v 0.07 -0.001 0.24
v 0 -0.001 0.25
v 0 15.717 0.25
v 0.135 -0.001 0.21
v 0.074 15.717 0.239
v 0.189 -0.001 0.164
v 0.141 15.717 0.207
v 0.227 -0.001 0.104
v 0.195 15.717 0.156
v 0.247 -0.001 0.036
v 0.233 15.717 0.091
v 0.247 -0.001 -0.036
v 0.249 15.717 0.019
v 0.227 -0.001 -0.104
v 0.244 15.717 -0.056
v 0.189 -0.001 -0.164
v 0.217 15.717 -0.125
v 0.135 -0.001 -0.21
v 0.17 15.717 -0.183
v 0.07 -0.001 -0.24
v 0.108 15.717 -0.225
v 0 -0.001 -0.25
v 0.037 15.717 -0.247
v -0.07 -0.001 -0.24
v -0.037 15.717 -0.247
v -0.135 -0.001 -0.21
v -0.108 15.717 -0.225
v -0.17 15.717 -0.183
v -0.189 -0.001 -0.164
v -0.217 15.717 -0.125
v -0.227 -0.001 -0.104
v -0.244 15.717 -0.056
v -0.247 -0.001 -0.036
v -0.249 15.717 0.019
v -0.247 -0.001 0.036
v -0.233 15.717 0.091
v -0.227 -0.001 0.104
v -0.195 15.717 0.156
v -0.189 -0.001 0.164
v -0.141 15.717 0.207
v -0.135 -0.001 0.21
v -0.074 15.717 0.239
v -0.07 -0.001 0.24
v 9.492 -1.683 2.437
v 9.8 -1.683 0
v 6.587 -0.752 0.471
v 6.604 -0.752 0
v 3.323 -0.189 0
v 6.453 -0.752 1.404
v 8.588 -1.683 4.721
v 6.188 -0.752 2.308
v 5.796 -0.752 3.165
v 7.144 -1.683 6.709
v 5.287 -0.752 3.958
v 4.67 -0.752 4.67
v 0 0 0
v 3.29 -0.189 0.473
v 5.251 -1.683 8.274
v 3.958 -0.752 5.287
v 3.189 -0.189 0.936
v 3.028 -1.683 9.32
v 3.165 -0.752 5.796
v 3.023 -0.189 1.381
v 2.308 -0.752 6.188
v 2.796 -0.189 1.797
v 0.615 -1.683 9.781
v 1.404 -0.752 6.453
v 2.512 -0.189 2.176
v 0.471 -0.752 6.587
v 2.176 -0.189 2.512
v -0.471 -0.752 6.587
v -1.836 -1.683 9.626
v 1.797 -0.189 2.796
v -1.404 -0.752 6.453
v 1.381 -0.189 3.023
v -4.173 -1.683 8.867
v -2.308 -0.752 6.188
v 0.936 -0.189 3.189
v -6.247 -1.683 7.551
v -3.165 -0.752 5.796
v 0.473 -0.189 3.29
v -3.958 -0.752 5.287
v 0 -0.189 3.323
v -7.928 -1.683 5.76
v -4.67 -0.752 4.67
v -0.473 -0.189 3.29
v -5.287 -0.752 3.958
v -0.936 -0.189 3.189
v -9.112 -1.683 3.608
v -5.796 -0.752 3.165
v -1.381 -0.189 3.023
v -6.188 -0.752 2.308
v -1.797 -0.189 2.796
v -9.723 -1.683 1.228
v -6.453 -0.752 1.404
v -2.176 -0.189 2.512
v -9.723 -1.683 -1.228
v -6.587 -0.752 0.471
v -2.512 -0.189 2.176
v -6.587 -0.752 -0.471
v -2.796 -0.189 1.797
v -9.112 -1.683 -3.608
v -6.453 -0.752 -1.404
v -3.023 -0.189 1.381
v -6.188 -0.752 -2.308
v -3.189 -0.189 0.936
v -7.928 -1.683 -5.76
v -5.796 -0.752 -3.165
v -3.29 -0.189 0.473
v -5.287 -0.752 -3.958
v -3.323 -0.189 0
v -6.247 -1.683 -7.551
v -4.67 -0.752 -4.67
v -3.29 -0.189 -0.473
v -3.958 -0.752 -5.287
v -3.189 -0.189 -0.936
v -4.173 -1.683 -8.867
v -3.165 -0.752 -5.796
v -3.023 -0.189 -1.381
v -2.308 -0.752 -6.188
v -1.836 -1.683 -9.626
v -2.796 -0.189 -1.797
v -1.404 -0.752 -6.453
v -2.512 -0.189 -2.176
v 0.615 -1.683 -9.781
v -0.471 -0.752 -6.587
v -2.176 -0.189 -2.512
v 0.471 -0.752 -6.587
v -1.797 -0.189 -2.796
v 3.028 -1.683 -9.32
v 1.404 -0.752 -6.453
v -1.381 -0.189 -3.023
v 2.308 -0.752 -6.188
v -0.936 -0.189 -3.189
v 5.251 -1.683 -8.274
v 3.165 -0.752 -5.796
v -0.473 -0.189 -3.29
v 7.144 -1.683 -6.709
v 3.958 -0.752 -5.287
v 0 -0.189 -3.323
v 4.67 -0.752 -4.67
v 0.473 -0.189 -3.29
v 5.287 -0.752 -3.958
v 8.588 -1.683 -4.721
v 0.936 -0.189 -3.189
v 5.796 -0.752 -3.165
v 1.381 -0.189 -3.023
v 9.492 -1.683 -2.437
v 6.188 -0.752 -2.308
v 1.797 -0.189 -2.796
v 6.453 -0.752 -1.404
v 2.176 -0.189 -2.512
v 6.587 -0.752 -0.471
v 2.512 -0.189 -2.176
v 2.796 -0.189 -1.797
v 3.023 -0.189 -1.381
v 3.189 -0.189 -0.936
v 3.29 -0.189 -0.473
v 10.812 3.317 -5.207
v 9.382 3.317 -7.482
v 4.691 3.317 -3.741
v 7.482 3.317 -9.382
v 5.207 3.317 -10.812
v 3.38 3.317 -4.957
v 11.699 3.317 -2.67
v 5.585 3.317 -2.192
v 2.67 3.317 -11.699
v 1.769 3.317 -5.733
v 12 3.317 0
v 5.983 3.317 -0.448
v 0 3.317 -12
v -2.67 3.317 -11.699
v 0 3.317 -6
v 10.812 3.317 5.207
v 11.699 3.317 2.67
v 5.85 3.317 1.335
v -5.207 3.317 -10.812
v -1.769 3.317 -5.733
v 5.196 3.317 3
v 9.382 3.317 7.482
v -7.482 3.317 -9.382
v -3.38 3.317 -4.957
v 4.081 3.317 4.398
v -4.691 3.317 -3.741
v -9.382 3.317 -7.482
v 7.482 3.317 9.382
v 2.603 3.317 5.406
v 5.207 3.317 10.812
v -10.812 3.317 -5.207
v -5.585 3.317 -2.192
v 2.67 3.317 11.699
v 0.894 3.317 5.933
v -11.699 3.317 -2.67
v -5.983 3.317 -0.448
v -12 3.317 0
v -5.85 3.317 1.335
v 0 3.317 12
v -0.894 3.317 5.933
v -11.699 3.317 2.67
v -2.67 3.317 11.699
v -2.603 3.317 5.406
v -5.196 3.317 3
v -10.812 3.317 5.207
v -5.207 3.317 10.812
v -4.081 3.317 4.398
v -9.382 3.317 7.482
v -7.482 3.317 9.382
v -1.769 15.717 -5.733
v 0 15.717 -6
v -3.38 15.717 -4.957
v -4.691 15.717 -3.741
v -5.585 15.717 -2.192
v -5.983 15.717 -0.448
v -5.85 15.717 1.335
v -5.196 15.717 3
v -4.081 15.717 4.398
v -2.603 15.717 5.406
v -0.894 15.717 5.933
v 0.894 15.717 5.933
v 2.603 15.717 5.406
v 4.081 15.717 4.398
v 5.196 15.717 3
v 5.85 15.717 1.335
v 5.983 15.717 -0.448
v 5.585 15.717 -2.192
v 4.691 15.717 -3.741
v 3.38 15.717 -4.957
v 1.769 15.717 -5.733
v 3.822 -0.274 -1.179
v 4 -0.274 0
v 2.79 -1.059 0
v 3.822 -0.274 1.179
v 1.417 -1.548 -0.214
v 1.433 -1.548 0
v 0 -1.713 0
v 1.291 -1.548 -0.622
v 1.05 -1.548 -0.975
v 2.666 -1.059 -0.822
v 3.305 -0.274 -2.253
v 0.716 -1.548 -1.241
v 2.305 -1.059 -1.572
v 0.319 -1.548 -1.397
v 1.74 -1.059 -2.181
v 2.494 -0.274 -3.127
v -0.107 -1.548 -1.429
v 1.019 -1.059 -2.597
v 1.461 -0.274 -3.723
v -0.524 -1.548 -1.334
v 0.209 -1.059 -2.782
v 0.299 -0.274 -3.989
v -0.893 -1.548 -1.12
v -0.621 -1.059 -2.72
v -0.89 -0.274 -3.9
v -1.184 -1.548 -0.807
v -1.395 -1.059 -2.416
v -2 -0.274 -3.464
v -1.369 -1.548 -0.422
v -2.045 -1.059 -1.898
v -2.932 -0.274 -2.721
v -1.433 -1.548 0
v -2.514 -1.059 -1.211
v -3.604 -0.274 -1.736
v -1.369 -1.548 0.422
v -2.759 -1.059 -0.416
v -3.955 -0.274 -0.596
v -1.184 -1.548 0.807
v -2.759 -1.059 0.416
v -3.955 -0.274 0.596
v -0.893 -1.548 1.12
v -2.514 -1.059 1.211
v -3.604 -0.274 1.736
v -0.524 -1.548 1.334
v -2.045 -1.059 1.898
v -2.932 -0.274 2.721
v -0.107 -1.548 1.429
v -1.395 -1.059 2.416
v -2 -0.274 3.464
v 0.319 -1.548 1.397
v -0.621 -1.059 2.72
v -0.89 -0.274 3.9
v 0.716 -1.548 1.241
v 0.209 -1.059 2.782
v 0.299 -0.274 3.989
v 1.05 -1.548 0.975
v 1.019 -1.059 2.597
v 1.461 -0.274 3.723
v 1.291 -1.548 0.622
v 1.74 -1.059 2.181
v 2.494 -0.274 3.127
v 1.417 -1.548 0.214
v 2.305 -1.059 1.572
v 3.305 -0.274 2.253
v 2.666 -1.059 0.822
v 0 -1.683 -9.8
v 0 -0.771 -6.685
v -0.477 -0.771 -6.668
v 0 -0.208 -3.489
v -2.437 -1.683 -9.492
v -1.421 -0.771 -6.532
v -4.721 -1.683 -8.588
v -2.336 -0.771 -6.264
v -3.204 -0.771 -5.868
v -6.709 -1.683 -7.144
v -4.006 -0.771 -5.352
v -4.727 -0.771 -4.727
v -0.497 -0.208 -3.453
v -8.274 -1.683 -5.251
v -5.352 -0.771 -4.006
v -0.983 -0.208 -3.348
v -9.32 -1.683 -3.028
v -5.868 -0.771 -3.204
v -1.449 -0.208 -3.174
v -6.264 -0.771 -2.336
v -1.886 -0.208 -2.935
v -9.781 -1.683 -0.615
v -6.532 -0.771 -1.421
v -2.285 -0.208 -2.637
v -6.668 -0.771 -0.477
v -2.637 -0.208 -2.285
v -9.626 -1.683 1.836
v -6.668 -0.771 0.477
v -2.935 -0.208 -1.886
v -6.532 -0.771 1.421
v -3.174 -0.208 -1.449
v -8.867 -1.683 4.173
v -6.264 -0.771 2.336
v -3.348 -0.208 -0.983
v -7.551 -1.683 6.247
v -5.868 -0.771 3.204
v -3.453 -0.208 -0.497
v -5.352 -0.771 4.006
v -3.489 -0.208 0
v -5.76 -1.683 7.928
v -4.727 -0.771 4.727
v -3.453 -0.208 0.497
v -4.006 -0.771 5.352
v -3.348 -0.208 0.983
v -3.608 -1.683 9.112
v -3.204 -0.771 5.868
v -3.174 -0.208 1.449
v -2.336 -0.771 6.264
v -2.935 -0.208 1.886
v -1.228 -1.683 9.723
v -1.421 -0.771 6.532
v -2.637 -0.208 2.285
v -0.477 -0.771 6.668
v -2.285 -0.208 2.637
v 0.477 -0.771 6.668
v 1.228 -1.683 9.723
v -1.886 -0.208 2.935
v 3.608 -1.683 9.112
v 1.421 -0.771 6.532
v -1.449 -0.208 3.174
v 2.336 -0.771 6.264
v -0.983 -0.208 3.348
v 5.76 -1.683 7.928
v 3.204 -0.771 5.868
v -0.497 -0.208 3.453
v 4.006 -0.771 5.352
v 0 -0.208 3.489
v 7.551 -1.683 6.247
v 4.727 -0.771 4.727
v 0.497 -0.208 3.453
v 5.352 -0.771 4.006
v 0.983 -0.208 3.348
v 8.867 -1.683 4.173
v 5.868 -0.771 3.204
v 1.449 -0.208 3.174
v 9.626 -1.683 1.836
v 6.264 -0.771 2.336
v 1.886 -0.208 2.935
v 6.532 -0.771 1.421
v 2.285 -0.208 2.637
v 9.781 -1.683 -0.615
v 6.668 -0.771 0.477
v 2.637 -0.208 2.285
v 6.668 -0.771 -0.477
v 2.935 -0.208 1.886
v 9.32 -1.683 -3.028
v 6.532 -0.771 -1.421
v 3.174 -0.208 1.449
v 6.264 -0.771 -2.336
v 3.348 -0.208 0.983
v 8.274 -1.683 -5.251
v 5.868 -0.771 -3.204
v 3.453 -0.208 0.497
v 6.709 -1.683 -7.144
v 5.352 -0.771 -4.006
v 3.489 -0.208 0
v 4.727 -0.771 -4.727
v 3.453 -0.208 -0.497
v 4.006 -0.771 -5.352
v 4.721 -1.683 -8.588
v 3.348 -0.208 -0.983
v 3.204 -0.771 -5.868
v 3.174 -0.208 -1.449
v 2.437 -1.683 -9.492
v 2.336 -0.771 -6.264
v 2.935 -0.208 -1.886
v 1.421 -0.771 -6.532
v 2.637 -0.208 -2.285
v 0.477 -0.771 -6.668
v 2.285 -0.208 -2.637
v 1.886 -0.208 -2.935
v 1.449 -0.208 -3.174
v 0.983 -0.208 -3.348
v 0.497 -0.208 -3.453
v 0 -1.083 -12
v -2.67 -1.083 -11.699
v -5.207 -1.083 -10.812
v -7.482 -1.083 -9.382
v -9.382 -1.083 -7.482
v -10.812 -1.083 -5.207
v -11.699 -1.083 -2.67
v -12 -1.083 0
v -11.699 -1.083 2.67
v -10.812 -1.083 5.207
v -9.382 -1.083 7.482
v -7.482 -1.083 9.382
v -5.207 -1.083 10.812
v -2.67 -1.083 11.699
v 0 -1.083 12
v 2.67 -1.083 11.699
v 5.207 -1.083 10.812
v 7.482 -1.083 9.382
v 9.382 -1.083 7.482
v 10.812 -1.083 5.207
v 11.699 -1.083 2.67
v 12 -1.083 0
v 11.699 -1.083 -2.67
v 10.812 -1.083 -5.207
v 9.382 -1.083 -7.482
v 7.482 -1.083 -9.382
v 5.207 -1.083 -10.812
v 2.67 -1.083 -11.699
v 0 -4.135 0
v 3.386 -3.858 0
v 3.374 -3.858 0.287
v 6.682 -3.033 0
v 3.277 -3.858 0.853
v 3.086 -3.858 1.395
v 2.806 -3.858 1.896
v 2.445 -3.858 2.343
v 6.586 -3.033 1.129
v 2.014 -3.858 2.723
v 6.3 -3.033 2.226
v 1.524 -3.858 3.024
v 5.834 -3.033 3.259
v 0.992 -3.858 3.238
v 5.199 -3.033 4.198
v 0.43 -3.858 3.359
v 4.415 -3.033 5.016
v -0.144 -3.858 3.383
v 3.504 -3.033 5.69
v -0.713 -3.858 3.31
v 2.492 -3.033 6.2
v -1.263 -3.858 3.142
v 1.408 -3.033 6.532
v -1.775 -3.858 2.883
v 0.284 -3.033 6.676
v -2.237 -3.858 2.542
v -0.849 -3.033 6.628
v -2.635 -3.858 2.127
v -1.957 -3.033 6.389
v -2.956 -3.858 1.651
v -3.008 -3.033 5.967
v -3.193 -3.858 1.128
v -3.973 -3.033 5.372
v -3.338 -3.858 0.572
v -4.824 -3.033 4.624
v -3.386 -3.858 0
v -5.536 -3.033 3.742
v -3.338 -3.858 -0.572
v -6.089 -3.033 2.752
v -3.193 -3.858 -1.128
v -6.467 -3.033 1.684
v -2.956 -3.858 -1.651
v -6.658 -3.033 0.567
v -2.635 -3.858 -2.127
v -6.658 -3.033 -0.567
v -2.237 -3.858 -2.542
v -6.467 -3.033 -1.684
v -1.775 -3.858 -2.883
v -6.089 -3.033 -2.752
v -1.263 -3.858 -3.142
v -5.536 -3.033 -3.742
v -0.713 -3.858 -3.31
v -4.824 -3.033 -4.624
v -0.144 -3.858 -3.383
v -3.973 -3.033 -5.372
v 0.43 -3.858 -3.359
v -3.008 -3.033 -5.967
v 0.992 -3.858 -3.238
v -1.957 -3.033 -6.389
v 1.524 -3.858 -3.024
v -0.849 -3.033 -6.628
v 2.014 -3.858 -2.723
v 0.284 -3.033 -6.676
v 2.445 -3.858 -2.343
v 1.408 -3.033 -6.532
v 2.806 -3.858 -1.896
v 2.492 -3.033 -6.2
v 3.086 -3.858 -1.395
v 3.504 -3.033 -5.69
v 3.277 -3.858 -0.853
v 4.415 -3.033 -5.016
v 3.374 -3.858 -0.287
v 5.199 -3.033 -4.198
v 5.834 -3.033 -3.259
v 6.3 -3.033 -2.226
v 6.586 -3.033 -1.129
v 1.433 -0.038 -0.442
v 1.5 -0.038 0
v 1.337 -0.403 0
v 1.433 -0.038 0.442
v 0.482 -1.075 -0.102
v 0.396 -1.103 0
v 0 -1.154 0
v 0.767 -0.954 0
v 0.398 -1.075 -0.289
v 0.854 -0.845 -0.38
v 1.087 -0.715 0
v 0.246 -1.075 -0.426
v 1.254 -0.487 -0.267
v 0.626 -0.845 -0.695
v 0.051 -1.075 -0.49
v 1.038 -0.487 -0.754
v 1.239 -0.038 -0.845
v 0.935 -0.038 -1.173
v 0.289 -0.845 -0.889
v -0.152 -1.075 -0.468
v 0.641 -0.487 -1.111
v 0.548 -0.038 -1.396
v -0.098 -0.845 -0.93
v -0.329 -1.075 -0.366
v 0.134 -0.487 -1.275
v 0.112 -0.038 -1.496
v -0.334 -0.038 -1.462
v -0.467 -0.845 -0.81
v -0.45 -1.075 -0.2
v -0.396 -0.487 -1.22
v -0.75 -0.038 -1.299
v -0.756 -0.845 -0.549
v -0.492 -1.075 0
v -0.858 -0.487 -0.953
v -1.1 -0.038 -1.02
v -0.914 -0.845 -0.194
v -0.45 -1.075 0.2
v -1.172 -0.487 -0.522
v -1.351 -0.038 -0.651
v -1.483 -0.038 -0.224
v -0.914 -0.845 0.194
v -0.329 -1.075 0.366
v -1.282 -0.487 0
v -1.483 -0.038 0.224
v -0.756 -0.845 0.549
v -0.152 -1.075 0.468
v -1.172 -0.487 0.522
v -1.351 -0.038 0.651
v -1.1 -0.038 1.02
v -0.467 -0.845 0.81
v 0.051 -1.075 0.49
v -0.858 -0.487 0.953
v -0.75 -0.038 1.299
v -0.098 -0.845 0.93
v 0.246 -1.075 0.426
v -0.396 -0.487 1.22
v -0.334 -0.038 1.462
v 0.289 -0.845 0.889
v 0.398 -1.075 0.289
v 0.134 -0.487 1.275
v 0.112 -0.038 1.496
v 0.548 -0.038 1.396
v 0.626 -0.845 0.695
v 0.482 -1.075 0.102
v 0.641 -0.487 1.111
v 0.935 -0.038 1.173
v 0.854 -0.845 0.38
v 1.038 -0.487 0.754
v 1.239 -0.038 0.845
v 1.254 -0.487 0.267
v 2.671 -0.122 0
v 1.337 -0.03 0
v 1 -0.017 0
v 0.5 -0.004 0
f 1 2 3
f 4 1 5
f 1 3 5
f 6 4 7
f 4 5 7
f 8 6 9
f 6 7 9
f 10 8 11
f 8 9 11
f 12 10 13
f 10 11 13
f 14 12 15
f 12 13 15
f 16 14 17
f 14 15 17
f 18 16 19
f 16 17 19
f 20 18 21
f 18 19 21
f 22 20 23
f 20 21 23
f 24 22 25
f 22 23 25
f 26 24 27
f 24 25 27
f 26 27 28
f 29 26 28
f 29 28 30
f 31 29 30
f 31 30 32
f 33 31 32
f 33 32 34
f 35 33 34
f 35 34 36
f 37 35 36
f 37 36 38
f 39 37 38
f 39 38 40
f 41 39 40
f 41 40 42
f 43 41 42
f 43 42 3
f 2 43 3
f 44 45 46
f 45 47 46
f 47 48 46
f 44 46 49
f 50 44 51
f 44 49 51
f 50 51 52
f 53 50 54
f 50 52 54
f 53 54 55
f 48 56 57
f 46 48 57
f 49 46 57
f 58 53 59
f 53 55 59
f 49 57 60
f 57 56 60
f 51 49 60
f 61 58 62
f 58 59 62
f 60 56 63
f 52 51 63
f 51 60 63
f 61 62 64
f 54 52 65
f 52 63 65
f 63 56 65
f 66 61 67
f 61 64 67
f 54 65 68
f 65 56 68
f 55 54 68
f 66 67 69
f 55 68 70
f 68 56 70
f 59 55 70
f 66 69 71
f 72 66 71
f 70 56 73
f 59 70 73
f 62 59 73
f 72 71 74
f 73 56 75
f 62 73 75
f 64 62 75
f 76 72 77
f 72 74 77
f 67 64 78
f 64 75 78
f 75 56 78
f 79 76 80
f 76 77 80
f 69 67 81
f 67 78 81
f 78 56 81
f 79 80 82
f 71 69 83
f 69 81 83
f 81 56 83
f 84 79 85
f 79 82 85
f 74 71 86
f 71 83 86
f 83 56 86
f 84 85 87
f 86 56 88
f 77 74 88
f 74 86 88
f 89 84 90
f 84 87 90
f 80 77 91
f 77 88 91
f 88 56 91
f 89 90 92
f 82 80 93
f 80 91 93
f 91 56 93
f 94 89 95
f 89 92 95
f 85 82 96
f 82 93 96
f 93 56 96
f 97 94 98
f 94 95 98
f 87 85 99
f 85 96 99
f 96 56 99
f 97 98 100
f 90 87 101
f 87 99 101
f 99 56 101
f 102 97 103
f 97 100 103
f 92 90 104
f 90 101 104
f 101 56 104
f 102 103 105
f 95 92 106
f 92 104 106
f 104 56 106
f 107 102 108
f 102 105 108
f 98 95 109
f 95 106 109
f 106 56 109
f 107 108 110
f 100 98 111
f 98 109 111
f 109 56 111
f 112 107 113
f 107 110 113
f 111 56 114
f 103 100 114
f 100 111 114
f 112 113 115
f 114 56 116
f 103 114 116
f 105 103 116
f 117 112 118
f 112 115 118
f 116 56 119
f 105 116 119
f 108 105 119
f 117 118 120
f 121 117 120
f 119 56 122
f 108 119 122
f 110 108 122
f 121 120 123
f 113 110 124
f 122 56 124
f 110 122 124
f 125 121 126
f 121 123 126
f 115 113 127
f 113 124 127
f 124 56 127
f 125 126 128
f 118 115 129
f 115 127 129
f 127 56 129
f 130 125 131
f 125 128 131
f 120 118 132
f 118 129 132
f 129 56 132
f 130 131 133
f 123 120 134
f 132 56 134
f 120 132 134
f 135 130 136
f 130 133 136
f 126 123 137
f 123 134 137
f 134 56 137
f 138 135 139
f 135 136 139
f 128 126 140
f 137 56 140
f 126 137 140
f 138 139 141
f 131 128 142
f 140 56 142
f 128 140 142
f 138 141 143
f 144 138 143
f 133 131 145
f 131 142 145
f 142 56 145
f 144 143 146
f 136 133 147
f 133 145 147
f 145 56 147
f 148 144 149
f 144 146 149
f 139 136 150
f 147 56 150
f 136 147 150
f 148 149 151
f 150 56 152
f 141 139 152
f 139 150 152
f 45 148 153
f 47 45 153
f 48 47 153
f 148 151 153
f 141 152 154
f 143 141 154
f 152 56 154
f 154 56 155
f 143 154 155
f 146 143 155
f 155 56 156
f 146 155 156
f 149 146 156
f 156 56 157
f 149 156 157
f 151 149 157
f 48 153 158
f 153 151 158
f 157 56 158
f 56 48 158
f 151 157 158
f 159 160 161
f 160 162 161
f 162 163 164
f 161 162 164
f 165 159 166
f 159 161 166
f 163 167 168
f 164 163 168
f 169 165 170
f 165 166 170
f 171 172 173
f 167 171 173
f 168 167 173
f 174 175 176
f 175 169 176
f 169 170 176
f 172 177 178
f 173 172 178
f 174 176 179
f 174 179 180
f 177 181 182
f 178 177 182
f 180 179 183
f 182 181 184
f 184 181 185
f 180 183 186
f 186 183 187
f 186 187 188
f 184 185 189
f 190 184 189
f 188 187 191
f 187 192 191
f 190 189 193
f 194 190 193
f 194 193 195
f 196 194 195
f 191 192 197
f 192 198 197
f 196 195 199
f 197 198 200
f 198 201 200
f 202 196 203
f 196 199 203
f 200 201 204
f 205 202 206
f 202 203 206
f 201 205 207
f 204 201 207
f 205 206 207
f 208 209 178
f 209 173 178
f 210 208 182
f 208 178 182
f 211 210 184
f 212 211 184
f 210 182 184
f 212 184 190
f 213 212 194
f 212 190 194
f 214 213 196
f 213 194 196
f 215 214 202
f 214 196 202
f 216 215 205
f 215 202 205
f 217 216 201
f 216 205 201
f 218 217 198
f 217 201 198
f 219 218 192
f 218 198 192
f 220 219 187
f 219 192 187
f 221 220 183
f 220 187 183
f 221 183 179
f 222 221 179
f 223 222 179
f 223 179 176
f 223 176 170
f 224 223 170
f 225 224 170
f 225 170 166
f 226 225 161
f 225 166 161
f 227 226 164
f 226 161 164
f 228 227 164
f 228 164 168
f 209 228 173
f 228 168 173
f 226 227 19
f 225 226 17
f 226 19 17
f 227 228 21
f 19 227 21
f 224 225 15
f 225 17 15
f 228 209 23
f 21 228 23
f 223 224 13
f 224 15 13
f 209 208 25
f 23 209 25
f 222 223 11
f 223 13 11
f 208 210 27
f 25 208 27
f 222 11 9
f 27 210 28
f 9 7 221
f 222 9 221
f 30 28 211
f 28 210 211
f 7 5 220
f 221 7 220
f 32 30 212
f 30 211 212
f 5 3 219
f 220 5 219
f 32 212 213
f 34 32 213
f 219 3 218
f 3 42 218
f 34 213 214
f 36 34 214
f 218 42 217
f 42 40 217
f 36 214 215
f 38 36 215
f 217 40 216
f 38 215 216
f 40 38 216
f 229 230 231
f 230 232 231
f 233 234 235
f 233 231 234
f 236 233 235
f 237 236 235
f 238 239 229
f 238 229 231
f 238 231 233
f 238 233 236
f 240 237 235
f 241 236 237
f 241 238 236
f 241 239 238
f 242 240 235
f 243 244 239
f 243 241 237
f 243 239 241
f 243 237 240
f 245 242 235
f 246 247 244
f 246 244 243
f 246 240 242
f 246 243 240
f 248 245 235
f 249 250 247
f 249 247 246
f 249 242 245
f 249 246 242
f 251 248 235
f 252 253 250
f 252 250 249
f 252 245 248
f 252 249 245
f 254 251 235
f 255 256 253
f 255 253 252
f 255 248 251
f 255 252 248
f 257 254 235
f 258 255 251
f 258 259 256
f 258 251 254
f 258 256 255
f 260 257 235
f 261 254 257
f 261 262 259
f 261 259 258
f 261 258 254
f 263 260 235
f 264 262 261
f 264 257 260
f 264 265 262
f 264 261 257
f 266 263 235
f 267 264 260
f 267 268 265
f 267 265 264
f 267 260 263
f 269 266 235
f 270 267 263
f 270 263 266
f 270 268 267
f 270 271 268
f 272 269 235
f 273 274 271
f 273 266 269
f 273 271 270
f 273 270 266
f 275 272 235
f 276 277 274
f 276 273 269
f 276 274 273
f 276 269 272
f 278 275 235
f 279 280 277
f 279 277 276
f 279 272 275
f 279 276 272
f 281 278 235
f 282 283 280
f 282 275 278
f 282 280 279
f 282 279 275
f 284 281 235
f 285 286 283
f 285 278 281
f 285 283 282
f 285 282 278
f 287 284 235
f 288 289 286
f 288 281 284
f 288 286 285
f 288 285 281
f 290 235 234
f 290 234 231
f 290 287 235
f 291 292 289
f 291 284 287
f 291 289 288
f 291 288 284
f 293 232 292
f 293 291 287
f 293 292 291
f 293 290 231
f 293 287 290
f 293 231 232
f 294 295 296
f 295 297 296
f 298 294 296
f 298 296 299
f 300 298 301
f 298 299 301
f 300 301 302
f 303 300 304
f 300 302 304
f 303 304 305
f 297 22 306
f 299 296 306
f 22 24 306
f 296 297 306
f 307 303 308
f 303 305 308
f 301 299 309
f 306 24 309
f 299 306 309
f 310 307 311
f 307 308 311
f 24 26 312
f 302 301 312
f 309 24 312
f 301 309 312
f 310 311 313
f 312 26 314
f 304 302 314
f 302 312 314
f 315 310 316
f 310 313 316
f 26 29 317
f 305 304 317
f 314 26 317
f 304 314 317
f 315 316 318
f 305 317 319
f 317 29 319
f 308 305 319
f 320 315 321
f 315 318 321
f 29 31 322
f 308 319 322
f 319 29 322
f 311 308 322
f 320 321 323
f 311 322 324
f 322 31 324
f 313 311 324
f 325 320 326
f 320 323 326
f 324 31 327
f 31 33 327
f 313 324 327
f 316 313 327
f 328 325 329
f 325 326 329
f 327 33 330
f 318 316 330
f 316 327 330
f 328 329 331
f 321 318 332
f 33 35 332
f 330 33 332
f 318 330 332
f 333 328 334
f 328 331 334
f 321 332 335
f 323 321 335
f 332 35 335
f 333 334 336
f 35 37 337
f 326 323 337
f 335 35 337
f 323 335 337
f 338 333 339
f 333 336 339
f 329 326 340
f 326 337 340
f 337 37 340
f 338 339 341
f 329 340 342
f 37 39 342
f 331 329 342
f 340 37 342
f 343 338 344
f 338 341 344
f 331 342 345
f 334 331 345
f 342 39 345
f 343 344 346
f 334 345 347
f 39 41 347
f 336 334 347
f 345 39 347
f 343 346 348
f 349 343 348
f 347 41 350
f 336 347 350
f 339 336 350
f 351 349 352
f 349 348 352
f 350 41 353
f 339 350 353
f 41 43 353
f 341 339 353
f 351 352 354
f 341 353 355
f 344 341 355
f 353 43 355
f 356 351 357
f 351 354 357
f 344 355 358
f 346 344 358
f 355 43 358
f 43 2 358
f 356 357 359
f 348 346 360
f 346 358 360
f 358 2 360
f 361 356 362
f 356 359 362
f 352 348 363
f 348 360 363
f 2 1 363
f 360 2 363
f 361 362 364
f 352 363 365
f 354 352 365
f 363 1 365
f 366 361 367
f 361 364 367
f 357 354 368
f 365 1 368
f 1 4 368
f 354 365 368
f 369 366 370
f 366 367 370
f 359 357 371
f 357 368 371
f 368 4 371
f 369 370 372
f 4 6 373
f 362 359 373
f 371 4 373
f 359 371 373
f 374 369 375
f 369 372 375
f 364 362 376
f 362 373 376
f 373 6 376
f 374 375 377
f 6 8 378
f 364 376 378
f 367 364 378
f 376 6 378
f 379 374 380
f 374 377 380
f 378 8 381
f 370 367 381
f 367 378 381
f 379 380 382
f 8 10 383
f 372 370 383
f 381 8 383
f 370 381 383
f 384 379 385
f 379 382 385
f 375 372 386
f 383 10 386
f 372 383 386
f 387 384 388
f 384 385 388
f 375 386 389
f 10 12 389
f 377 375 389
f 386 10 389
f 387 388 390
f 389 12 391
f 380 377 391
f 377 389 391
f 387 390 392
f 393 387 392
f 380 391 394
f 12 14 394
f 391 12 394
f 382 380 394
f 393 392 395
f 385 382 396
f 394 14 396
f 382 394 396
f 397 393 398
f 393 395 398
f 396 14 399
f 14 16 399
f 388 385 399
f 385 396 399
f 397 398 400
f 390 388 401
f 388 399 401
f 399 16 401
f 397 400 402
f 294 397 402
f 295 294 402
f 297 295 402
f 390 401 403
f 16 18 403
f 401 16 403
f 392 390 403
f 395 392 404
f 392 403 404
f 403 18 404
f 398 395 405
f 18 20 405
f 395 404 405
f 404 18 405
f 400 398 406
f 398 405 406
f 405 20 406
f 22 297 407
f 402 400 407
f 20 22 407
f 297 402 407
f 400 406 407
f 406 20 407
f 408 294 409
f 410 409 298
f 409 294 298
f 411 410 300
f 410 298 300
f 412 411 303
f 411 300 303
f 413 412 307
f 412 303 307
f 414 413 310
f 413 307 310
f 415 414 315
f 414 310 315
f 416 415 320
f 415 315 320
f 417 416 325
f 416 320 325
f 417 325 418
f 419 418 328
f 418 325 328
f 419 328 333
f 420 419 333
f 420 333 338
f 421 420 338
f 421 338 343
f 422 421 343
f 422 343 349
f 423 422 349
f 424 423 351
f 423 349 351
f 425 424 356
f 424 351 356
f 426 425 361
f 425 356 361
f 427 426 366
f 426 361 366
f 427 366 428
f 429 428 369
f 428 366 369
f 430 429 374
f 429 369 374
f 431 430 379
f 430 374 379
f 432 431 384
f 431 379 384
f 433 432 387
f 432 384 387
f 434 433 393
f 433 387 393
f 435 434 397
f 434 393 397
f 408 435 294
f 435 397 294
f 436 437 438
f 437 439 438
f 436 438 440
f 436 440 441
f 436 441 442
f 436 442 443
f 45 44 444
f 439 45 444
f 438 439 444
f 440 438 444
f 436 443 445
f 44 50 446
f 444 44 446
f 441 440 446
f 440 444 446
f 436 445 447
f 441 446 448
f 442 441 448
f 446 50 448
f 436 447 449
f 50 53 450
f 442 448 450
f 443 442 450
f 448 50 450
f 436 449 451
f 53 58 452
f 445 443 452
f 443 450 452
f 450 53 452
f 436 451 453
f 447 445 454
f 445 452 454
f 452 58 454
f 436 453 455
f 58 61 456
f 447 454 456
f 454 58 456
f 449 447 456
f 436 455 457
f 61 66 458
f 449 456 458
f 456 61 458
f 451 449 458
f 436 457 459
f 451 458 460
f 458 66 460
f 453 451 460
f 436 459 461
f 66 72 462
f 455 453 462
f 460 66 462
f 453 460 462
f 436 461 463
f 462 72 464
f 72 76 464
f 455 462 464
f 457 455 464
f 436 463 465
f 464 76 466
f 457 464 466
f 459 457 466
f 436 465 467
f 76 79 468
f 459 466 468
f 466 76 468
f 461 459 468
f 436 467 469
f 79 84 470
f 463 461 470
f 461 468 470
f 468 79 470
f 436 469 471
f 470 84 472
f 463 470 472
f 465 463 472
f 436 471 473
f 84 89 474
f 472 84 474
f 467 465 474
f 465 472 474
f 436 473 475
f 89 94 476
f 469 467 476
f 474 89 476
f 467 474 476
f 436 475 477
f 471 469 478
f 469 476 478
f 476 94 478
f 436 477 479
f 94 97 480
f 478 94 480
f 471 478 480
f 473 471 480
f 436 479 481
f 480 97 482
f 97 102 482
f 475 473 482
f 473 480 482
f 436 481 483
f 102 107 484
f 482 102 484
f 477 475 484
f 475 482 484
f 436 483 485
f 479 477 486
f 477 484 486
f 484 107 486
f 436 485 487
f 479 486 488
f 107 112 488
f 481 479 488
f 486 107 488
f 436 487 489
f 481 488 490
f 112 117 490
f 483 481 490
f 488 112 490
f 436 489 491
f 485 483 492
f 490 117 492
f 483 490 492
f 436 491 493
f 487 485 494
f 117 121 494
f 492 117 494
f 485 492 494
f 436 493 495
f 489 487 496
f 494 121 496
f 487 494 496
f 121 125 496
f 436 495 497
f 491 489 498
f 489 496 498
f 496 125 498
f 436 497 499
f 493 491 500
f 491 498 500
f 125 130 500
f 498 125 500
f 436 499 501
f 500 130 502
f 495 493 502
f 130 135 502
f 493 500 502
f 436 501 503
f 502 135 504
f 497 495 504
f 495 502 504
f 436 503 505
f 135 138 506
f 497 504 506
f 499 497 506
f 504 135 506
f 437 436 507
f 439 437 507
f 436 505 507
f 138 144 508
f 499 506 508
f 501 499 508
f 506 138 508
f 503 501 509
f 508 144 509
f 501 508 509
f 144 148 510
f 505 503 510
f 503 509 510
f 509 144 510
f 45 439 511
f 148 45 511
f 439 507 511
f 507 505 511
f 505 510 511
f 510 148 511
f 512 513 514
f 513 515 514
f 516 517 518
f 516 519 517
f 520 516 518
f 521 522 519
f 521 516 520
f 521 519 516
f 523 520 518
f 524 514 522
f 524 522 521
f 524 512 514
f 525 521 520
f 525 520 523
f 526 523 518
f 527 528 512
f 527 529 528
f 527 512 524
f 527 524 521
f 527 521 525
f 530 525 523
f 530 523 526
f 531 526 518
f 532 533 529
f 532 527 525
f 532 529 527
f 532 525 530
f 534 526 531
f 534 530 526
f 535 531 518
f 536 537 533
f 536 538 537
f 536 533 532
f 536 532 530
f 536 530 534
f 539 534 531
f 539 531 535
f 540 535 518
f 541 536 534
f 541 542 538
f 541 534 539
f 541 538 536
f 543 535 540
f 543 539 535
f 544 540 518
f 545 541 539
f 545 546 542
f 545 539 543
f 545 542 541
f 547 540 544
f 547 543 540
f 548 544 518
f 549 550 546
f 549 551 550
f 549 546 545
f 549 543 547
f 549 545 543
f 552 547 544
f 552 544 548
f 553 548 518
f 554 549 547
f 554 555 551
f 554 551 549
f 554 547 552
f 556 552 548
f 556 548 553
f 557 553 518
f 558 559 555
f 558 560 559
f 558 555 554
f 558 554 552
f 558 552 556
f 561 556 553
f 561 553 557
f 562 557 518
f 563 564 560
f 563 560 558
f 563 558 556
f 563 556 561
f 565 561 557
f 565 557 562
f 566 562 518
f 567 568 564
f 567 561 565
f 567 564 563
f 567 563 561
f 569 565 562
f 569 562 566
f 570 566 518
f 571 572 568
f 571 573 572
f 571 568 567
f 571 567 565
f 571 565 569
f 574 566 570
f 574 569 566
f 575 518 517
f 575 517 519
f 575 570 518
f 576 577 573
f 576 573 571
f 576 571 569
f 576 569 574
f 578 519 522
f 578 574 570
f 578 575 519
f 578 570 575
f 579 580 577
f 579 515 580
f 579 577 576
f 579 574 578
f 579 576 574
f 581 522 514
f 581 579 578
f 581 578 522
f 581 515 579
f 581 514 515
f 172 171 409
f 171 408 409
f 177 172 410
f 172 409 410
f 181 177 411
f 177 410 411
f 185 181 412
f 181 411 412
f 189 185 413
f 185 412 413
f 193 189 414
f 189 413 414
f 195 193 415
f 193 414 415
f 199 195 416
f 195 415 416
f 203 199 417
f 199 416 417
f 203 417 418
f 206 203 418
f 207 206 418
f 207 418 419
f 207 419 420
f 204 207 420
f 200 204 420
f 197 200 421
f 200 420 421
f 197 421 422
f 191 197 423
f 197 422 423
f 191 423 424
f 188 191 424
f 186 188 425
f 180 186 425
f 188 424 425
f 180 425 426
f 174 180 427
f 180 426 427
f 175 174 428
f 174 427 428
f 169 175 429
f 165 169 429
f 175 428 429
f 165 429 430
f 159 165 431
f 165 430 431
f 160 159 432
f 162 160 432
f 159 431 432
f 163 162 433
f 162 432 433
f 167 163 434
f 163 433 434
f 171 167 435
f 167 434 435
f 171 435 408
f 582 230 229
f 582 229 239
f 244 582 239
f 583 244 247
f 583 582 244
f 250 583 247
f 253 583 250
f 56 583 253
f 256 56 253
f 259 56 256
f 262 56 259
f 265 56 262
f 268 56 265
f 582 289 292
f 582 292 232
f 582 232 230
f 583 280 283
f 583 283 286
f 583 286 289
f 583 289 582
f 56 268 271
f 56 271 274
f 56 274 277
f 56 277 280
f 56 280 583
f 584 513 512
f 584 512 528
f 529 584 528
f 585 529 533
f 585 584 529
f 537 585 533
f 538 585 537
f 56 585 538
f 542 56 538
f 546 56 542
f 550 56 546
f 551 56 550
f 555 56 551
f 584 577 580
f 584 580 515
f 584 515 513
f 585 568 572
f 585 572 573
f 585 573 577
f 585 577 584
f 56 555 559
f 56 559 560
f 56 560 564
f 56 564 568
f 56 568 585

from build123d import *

# Parameters (mm, degrees)
CUT_EXTRUDE1_REACH      = 26.306
CUT_EXTRUDE1_END_RADIUS = 29.375452146
SKETCH4_R               = 0.25


with BuildPart() as part:
    # Sketch1 → Revolve1 (revolve)
    with BuildSketch(Plane.XY, mode=Mode.PRIVATE) as revolve1_sk:
        with BuildLine():
            Line((0, 0), (0, 15.717095385))
            Line((0, 15.717095385), (6, 15.717095385))
            Line((6, 15.717095385), (6, 3.317095385))
            Line((6, 3.317095385), (12, 3.317095385))
            Line((12, 3.317095385), (12, -1.082904615))
            Line((12, -1.082904615), (9.8, -1.682904615))
            ThreePointArc((9.8, -1.682904615), (4.971724247, -0.423782992), (0, 0))
        make_face()
    revolve(revolve1_sk.sketch.rotate(Axis((0, 0, 0), (0, 1, 0)), 90), axis=Axis((0, 0, 0), (0, 1, 0)))

    # Cut-Extrude1: up to this sphere (the profile starts outside it)
    cut_extrude1_end = Location((0, -29.375452146, 0)) * Sphere(CUT_EXTRUDE1_END_RADIUS, mode=Mode.PRIVATE)
    # Sketch4 → Cut-Extrude1 (cut, up to the surface)
    with BuildSketch(Plane(origin=(0, 15.717095385, 0), x_dir=(1, 0, 0), z_dir=(0, 1, 0)), mode=Mode.PRIVATE) as cut_extrude1_sk1:
        with Locations(Location((0, 0, 0), (0, 0, 270))):
            Circle(SKETCH4_R)
    cut_extrude1_tool1 = extrude(cut_extrude1_sk1.sketch, amount=-CUT_EXTRUDE1_REACH, mode=Mode.PRIVATE) - cut_extrude1_end
    add(cut_extrude1_tool1.solids().sort_by_distance((0, 15.717095, 0))[0], mode=Mode.SUBTRACT)


with BuildPart() as body_2:
    # Sketch3 → Revolve2 (revolve)
    with BuildSketch(Plane.XY):
        with BuildLine():
            ThreePointArc((1.5, -0.03832228), (0.750244726, -0.009582133), (0, 0))
            Line((0, 0), (0, -1.154286574))
            ThreePointArc((0, -1.154286574), (0.934796275, -0.844694465), (1.5, -0.03832228))
        make_face()
    revolve(axis=Axis((0, 0, 0), (0, 1, 0)))


with BuildPart() as body_3:
    # Sketch5 → Revolve3 (revolve)
    with BuildSketch(Plane.XY):
        with BuildLine():
            ThreePointArc((4, -0.273610473), (2.004673458, -0.068482444), (0, 0))
            Line((0, 0), (0, -1.713499762))
            ThreePointArc((0, -1.713499762), (2.125634092, -1.342565538), (4, -0.273610473))
        make_face()
    revolve(axis=Axis((0, 0, 0), (0, 1, 0)))


with BuildPart() as body_4:
    # Sketch7 → Revolve4 (revolve)
    with BuildSketch(Plane.XY):
        with BuildLine():
            Line((0, 0), (0, -4.135168159))
            ThreePointArc((0, -4.135168159), (5.051079006, -3.5127946), (9.8, -1.682904615))
            ThreePointArc((9.8, -1.682904615), (4.971724247, -0.423782992), (0, 0))
        make_face()
    revolve(axis=Axis((0, 0, 0), (0, -1, 0)))


solid = Compound([part.part, body_2.part, body_3.part, body_4.part])
